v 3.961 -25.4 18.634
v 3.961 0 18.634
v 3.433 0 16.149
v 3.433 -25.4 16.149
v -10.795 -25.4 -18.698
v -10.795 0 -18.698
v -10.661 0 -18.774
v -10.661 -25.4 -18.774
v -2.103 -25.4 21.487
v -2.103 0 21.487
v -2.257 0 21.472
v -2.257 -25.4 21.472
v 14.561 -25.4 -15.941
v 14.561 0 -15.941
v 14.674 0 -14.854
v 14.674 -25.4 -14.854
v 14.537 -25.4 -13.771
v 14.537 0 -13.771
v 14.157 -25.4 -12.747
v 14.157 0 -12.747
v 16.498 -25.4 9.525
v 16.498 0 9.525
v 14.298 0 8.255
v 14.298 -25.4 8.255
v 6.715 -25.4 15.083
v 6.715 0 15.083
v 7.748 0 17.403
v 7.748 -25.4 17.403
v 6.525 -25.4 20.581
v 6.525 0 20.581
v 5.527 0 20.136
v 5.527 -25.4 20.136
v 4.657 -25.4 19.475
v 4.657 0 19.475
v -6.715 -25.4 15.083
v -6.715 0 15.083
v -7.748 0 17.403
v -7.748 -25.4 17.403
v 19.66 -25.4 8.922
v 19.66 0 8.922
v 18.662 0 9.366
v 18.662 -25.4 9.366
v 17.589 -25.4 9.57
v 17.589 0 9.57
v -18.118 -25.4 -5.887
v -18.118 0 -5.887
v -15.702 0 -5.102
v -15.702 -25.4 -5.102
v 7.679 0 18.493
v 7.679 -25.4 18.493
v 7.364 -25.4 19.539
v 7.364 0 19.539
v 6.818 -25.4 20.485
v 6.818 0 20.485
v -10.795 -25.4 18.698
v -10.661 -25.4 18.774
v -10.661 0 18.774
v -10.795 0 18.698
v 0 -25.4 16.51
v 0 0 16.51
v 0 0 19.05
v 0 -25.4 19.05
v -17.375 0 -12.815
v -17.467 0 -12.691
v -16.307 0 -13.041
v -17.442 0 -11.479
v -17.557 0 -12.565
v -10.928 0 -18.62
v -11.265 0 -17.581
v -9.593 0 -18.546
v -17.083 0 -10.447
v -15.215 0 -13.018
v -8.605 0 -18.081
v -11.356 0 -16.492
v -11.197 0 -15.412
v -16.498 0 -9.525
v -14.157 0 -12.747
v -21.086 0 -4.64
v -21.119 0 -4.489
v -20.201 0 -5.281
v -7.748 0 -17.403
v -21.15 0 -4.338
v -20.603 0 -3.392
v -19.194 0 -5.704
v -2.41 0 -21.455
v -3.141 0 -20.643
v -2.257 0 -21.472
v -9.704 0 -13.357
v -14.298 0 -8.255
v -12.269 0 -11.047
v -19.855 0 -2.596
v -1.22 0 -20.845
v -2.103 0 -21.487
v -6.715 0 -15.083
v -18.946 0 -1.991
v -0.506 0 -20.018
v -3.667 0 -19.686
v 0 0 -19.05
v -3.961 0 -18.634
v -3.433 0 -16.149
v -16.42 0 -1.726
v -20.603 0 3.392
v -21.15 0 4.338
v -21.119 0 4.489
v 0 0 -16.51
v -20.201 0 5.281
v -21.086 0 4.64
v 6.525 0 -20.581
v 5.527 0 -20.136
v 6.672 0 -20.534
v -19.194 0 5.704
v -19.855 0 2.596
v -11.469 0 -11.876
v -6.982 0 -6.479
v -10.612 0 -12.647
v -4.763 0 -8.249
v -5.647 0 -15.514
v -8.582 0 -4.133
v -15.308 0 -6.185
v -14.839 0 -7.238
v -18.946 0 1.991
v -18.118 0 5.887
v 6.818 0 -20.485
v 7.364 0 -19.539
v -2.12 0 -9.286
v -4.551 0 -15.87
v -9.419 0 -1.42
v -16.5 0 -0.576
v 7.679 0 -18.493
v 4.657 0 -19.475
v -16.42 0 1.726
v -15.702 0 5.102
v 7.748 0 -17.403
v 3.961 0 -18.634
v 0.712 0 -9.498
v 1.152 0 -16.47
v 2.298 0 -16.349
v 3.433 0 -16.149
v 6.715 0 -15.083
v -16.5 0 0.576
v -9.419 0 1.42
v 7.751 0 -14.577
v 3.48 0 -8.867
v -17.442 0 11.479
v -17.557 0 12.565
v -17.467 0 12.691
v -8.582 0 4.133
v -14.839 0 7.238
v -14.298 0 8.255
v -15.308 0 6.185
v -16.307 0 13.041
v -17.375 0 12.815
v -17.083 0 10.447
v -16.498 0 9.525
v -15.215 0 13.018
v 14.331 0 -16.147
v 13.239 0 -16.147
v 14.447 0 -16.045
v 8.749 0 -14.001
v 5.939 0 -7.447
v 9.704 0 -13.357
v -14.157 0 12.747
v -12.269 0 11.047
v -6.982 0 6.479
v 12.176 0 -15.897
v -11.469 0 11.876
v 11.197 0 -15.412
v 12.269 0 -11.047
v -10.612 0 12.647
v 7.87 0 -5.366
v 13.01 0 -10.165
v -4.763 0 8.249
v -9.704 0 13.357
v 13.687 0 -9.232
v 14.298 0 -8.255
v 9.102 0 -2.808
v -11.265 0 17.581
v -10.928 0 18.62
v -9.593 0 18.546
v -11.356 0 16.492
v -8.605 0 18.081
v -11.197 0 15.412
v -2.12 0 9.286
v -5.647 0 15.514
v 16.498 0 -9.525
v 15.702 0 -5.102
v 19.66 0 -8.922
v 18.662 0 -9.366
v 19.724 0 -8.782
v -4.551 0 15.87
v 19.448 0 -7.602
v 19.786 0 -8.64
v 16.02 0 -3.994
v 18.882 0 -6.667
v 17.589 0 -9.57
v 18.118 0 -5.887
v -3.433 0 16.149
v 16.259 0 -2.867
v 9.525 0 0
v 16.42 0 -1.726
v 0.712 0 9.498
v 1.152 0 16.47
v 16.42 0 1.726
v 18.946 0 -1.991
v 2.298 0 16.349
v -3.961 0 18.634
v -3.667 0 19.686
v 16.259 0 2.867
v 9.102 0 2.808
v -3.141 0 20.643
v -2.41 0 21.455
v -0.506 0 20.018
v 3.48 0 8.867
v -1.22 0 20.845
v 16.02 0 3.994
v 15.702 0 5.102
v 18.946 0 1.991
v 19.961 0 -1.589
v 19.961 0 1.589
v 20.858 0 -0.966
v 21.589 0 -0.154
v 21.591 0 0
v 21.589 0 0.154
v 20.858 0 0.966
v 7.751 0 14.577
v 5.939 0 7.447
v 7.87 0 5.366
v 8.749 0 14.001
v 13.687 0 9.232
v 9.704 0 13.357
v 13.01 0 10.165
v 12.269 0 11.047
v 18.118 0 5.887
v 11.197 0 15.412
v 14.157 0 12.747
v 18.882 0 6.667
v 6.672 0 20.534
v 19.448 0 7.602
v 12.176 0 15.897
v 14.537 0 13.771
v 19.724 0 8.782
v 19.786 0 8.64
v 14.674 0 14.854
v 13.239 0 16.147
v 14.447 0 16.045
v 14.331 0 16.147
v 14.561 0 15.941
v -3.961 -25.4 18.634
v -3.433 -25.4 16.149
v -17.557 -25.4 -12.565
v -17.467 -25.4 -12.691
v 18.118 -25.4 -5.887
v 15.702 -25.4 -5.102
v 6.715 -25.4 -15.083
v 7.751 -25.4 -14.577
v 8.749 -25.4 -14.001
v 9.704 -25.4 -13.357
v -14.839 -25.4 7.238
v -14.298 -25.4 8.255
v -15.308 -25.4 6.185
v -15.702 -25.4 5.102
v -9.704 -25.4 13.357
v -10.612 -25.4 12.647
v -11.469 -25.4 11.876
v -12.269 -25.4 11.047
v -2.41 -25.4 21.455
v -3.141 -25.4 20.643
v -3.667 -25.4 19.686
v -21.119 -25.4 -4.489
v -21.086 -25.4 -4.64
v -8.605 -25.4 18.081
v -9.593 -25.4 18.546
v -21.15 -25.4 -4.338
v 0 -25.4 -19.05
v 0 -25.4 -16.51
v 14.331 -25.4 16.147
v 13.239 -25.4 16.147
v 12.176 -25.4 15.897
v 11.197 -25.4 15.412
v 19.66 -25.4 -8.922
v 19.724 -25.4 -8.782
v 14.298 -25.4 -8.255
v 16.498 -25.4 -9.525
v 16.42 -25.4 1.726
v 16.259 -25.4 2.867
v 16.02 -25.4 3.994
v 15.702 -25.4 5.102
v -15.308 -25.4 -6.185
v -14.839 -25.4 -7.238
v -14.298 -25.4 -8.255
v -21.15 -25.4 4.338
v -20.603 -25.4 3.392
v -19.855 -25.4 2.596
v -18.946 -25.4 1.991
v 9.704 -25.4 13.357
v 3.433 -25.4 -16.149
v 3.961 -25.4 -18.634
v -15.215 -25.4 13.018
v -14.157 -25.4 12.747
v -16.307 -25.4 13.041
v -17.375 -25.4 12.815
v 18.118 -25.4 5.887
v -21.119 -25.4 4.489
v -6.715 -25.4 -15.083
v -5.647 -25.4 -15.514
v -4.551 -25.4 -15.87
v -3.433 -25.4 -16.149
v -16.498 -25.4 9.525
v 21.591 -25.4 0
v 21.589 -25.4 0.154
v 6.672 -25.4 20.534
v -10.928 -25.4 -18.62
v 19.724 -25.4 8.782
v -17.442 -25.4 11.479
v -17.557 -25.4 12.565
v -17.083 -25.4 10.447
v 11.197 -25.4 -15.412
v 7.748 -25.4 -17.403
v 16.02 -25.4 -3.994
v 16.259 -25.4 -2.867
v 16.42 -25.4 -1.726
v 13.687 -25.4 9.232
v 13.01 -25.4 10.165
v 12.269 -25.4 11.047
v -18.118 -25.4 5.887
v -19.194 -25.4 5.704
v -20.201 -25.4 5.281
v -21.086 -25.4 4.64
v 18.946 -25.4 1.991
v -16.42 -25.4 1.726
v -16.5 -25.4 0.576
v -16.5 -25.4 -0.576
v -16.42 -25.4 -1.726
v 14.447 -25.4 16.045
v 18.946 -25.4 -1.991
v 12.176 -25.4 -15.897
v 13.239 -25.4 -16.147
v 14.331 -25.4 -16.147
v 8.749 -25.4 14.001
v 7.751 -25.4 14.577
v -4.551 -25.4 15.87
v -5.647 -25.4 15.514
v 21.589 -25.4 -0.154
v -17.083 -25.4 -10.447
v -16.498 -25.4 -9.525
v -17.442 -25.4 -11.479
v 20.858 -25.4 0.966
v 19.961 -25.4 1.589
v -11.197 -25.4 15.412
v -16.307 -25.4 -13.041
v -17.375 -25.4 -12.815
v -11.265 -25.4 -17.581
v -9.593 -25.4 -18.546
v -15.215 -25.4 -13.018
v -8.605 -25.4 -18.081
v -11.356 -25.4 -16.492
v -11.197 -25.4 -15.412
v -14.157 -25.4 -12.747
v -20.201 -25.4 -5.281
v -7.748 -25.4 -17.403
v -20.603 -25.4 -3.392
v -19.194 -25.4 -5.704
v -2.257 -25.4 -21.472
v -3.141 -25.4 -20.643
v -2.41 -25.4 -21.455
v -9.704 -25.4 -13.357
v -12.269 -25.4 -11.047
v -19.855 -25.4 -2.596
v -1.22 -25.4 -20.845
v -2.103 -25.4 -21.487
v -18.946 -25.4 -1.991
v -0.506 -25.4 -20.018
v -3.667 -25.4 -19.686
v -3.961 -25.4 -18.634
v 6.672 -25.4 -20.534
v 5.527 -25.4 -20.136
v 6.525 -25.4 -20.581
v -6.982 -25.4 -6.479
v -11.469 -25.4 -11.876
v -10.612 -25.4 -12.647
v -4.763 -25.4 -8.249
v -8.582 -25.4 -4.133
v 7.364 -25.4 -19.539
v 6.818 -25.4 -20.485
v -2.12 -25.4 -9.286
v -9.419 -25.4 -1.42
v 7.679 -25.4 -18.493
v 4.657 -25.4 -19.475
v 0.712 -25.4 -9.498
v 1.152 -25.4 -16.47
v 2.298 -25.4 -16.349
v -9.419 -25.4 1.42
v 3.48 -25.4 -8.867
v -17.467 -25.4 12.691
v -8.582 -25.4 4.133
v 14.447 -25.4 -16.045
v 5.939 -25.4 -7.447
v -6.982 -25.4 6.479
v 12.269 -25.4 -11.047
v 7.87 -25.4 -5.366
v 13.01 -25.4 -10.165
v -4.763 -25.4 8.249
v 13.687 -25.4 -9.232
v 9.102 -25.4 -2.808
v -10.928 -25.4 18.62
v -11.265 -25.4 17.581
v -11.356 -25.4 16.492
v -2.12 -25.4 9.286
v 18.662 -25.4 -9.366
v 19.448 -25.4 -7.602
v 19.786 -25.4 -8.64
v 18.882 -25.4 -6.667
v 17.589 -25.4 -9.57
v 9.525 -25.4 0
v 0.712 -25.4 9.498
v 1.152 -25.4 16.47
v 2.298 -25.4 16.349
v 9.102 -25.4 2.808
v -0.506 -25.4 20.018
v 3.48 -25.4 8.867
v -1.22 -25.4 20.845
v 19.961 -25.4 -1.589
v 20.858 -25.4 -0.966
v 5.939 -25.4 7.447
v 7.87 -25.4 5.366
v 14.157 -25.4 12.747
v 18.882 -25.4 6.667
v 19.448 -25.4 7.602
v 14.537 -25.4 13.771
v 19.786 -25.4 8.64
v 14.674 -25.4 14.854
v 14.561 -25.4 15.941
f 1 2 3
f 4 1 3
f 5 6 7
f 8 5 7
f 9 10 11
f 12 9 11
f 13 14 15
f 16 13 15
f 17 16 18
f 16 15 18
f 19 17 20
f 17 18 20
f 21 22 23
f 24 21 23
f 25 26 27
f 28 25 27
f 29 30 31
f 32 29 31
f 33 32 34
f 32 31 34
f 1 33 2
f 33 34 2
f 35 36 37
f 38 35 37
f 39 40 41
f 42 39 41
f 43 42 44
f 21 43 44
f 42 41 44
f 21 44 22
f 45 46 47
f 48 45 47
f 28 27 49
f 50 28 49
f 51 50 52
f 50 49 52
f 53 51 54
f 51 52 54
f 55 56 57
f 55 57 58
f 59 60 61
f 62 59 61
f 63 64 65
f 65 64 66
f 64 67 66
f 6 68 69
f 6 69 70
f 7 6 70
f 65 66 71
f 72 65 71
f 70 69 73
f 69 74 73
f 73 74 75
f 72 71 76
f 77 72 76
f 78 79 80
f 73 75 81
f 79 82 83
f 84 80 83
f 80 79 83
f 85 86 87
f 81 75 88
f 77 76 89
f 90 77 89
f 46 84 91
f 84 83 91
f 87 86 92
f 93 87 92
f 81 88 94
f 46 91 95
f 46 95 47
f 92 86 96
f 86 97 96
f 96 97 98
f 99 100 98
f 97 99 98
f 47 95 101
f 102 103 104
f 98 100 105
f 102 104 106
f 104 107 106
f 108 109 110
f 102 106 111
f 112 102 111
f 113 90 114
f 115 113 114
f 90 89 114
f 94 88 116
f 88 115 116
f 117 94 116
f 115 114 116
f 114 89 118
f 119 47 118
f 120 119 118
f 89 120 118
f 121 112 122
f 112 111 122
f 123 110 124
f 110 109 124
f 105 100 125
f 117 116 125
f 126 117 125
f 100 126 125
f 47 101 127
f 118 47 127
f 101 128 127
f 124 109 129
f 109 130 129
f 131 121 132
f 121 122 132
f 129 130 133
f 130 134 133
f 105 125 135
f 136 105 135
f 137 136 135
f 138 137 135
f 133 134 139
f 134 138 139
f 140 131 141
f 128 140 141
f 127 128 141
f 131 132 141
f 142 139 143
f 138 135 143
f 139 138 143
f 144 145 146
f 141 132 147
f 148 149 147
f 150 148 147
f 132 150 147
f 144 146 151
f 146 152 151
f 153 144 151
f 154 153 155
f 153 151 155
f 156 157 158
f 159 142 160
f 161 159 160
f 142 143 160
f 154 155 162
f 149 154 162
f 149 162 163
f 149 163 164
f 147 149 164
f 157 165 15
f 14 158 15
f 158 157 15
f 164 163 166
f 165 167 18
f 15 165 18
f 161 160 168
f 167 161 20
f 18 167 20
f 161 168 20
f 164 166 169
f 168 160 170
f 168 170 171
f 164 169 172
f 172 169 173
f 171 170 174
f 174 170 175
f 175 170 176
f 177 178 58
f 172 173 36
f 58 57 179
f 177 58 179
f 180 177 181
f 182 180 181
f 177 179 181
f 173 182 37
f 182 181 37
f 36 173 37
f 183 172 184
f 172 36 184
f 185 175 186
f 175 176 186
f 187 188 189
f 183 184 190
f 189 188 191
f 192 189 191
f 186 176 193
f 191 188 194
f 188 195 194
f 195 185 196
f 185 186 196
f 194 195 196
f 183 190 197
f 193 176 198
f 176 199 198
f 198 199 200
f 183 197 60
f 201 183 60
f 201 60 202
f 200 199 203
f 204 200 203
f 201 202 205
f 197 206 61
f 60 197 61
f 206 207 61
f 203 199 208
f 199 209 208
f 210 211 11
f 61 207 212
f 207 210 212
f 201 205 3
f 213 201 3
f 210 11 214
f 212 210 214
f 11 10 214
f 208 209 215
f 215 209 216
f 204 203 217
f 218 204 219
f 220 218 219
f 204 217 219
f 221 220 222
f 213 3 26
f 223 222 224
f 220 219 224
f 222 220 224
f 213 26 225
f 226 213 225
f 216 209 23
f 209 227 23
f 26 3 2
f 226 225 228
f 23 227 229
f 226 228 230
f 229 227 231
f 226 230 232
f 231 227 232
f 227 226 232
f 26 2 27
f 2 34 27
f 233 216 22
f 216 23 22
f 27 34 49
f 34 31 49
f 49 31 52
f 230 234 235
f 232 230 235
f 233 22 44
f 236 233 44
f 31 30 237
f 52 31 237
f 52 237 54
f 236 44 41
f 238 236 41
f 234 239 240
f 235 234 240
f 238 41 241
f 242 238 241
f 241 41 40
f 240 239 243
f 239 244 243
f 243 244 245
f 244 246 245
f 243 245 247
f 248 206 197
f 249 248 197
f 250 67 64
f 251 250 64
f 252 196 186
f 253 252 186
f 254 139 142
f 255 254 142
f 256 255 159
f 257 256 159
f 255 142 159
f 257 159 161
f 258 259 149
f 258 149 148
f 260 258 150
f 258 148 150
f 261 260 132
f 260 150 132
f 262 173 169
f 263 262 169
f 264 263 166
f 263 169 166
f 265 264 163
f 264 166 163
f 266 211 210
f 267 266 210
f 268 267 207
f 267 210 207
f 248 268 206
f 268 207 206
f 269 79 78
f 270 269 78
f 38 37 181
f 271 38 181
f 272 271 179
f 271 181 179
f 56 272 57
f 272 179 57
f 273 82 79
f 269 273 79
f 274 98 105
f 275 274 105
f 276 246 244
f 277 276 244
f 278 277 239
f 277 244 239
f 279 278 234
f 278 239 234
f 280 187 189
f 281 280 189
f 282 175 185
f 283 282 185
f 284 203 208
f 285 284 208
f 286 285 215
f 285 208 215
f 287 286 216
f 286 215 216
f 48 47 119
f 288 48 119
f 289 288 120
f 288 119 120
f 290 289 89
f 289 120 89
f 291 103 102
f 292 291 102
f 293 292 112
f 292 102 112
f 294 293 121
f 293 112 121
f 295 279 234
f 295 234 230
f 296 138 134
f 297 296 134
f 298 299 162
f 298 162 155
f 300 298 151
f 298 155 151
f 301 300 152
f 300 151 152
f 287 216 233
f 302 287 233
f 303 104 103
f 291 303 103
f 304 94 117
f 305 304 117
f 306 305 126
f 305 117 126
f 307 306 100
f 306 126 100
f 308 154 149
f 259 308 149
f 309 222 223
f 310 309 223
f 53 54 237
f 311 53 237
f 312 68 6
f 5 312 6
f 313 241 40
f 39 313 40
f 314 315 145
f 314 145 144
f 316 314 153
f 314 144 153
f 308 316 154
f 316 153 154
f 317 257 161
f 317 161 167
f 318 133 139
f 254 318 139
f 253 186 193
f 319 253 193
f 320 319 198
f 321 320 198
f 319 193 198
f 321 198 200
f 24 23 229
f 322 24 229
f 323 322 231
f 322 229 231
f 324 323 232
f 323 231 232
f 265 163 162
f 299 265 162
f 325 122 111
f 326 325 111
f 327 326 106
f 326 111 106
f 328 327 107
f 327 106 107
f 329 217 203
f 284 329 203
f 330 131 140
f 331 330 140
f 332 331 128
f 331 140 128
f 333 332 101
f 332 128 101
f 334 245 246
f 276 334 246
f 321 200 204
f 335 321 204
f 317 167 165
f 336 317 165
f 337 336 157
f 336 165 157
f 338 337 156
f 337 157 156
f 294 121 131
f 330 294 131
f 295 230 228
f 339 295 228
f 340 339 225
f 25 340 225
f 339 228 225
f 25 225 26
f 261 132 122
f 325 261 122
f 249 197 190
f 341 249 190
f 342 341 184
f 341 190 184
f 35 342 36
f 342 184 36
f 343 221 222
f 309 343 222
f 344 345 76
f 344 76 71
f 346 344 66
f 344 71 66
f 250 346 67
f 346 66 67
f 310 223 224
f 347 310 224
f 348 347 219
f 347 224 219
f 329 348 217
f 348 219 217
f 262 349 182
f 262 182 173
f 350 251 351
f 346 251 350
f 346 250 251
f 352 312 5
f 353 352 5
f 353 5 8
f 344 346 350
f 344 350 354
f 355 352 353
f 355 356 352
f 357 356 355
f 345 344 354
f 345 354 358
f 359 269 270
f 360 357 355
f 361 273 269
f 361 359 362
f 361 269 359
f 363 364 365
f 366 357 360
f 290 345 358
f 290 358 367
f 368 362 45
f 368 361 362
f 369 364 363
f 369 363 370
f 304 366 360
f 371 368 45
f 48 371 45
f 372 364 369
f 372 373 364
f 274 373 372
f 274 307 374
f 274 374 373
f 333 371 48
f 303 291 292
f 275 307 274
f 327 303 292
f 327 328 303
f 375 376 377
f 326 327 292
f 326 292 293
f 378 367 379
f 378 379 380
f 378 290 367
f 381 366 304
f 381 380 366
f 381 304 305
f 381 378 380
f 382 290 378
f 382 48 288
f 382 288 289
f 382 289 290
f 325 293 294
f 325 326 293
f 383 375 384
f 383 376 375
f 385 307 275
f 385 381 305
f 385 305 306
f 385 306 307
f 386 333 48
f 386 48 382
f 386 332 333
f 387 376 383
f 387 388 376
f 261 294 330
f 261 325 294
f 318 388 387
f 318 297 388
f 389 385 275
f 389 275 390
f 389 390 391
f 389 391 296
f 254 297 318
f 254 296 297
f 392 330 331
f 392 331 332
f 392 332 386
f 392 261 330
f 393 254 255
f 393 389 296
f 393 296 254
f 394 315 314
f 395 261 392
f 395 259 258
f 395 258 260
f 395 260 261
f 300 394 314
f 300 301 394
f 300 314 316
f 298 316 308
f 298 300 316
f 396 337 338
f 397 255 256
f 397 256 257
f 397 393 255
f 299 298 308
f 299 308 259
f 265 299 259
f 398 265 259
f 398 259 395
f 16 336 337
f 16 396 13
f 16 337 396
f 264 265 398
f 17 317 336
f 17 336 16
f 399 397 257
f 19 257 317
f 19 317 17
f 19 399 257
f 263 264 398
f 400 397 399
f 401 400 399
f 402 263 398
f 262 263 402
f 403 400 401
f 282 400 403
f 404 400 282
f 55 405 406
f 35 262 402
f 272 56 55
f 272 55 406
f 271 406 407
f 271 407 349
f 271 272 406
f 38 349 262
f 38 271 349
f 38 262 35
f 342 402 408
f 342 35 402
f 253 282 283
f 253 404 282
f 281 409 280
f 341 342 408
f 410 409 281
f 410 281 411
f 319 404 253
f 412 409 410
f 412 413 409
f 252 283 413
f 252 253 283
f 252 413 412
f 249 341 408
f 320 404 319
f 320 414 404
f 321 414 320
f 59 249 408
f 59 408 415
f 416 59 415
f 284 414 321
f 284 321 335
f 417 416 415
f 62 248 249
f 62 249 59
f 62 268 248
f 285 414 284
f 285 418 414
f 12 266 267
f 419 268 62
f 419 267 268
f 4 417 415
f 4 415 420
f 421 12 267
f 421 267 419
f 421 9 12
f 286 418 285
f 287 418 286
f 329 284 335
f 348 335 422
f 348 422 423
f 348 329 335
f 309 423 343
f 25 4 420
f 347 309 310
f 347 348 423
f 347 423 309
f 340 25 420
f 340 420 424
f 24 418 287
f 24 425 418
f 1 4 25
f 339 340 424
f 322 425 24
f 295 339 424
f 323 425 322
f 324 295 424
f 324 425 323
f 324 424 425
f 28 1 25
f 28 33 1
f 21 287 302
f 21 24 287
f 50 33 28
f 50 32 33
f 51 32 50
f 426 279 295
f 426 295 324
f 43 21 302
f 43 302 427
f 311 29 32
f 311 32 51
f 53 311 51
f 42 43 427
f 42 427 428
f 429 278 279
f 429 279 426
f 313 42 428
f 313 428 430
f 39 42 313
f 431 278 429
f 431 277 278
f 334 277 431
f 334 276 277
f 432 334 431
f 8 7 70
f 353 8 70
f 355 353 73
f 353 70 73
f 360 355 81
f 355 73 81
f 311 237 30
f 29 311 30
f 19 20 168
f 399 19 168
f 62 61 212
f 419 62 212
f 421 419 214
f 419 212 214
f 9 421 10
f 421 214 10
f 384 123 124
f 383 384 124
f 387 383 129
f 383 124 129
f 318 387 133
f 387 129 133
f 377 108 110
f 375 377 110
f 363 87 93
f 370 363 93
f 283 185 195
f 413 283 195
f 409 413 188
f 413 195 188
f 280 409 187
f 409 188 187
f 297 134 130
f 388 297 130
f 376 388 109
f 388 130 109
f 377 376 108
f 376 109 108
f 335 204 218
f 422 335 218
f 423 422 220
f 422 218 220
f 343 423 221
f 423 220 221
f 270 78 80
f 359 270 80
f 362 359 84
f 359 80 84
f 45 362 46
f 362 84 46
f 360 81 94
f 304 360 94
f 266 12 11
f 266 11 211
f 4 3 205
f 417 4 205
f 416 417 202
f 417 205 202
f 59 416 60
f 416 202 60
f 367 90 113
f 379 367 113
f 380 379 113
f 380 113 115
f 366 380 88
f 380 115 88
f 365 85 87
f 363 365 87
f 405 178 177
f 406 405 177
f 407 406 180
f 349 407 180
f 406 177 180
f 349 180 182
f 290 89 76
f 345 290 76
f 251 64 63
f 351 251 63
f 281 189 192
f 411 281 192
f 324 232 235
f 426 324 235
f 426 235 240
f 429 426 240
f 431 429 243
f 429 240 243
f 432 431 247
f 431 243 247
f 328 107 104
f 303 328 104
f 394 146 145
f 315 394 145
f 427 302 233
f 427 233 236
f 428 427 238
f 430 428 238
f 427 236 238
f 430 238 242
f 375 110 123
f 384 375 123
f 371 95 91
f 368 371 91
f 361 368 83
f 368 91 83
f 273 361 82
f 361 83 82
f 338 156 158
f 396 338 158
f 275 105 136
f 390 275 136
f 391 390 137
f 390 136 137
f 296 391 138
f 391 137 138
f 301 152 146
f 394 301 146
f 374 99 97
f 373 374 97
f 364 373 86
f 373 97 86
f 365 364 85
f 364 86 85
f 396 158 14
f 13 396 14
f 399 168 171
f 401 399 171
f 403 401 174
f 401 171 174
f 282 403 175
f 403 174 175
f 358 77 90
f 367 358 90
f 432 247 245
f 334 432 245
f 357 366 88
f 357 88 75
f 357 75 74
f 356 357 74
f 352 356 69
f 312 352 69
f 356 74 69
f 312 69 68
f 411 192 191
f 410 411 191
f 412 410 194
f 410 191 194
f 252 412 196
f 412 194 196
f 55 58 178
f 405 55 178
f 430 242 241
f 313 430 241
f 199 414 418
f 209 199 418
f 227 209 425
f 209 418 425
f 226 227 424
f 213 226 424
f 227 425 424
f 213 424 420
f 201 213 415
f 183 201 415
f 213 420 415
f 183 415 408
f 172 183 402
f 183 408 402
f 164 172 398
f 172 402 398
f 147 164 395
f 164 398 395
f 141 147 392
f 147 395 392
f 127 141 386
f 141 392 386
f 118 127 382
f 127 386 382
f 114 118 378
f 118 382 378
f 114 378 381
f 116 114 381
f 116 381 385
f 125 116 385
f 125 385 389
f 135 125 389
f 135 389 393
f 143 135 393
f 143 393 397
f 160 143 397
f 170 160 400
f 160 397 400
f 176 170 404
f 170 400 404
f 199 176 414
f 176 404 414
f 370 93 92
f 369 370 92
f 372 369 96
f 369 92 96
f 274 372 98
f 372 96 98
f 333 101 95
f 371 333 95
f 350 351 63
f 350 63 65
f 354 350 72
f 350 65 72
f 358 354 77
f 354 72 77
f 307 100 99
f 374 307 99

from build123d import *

# Parameters (mm, degrees)
F1_DEPTH = 25.4
F2_R     = 9.525
F3_DEPTH = 25.4


with BuildPart() as f1:
    # F0 (on Front) → F1 (new body)
    with BuildSketch(Plane.XZ):
        with BuildLine():
            Line((-3.960718, 18.633712), (-3.432622, 16.149217))
            ThreePointArc((-3.432622, 16.149217), (-5.101871, 15.701943), (-6.715222, 15.082636))
            Line((-6.715222, 15.082636), (-7.748333, 17.403041))
            ThreePointArc((-7.748333, 17.403041), (-9.085269, 18.342204), (-10.660947, 18.774246))
            Line((-10.660947, 18.774246), (-10.795276, 18.697967))
            Line((-10.795276, 18.697967), (-10.9285, 18.619774))
            ThreePointArc((-10.9285, 18.619774), (-11.34218, 17.039175), (-11.197309, 15.411774))
            Line((-11.197309, 15.411774), (-9.704335, 13.356871))
            ThreePointArc((-9.704335, 13.356871), (-11.047346, 12.269321), (-12.269321, 11.047346))
            Line((-12.269321, 11.047346), (-14.156909, 12.746938))
            ThreePointArc((-14.156909, 12.746938), (-15.760252, 13.061125), (-17.375434, 12.814929))
            Line((-17.375434, 12.814929), (-17.467124, 12.690608))
            Line((-17.467124, 12.690608), (-17.557026, 12.564989))
            ThreePointArc((-17.557026, 12.564989), (-17.292054, 10.952781), (-16.497784, 9.525))
            Line((-16.497784, 9.525), (-14.298079, 8.255))
            ThreePointArc((-14.298079, 8.255), (-15.082636, 6.715222), (-15.701943, 5.101871))
            Line((-15.701943, 5.101871), (-18.117627, 5.886774))
            ThreePointArc((-18.117627, 5.886774), (-19.710145, 5.52166), (-21.08555, 4.639795))
            Line((-21.08555, 4.639795), (-21.118747, 4.488928))
            Line((-21.118747, 4.488928), (-21.149783, 4.337602))
            ThreePointArc((-21.149783, 4.337602), (-20.251975, 2.972551), (-18.945642, 1.991267))
            Line((-18.945642, 1.991267), (-16.419556, 1.725765))
            ThreePointArc((-16.419556, 1.725765), (-16.51, 0), (-16.419556, -1.725765))
            Line((-16.419556, -1.725765), (-18.945642, -1.991267))
            ThreePointArc((-18.945642, -1.991267), (-20.251975, -2.972551), (-21.149783, -4.337602))
            Line((-21.149783, -4.337602), (-21.118747, -4.488928))
            Line((-21.118747, -4.488928), (-21.08555, -4.639795))
            ThreePointArc((-21.08555, -4.639795), (-19.710145, -5.52166), (-18.117627, -5.886774))
            Line((-18.117627, -5.886774), (-15.701943, -5.101871))
            ThreePointArc((-15.701943, -5.101871), (-15.082636, -6.715222), (-14.298079, -8.255))
            Line((-14.298079, -8.255), (-16.497784, -9.525))
            ThreePointArc((-16.497784, -9.525), (-17.292054, -10.952781), (-17.557026, -12.564989))
            Line((-17.557026, -12.564989), (-17.467124, -12.690608))
            Line((-17.467124, -12.690608), (-17.375434, -12.814929))
            ThreePointArc((-17.375434, -12.814929), (-15.760252, -13.061125), (-14.156909, -12.746938))
            Line((-14.156909, -12.746938), (-12.269321, -11.047346))
            ThreePointArc((-12.269321, -11.047346), (-11.047346, -12.269321), (-9.704335, -13.356871))
            Line((-9.704335, -13.356871), (-11.197309, -15.411774))
            ThreePointArc((-11.197309, -15.411774), (-11.34218, -17.039175), (-10.9285, -18.619774))
            Line((-10.9285, -18.619774), (-10.795276, -18.697967))
            Line((-10.795276, -18.697967), (-10.660947, -18.774246))
            ThreePointArc((-10.660947, -18.774246), (-9.085269, -18.342204), (-7.748333, -17.403041))
            Line((-7.748333, -17.403041), (-6.715222, -15.082636))
            ThreePointArc((-6.715222, -15.082636), (-5.101871, -15.701943), (-3.432622, -16.149217))
            Line((-3.432622, -16.149217), (-3.960718, -18.633712))
            ThreePointArc((-3.960718, -18.633712), (-3.43114, -20.179342), (-2.410337, -21.455031))
            Line((-2.410337, -21.455031), (-2.256827, -21.472277))
            Line((-2.256827, -21.472277), (-2.103086, -21.487325))
            ThreePointArc((-2.103086, -21.487325), (-0.839359, -20.451749), (0, -19.05))
            Line((0, -19.05), (0, -16.51))
            ThreePointArc((0, -16.51), (1.725765, -16.419556), (3.432622, -16.149217))
            Line((3.432622, -16.149217), (3.960718, -18.633712))
            ThreePointArc((3.960718, -18.633712), (5.073175, -19.830316), (6.524595, -20.580519))
            Line((6.524595, -20.580519), (6.671848, -20.533836))
            Line((6.671848, -20.533836), (6.818418, -20.48505))
            ThreePointArc((6.818418, -20.48505), (7.551683, -19.025), (7.748333, -17.403041))
            Line((7.748333, -17.403041), (6.715222, -15.082636))
            ThreePointArc((6.715222, -15.082636), (8.255, -14.298079), (9.704335, -13.356871))
            Line((9.704335, -13.356871), (11.197309, -15.411774))
            ThreePointArc((11.197309, -15.411774), (12.700292, -16.052449), (14.331365, -16.147448))
            Line((14.331365, -16.147448), (14.4469, -16.044907))
            Line((14.4469, -16.044907), (14.560955, -15.940724))
            ThreePointArc((14.560955, -15.940724), (14.63697, -14.308657), (14.156909, -12.746938))
            Line((14.156909, -12.746938), (12.269321, -11.047346))
            ThreePointArc((12.269321, -11.047346), (13.356871, -9.704335), (14.298079, -8.255))
            Line((14.298079, -8.255), (16.497784, -9.525))
            ThreePointArc((16.497784, -9.525), (18.131414, -9.498968), (19.660112, -8.922336))
            Line((19.660112, -8.922336), (19.723951, -8.781669))
            Line((19.723951, -8.781669), (19.785771, -8.640102))
            ThreePointArc((19.785771, -8.640102), (19.191393, -7.118216), (18.117627, -5.886774))
            Line((18.117627, -5.886774), (15.701943, -5.101871))
            ThreePointArc((15.701943, -5.101871), (16.149217, -3.432622), (16.419556, -1.725765))
            Line((16.419556, -1.725765), (18.945642, -1.991267))
            ThreePointArc((18.945642, -1.991267), (20.427449, -1.303029), (21.589447, -0.154472))
            Line((21.589447, -0.154472), (21.590553, 0))
            Line((21.590553, 0), (21.589447, 0.154472))
            ThreePointArc((21.589447, 0.154472), (20.427449, 1.303029), (18.945642, 1.991267))
            Line((18.945642, 1.991267), (16.419556, 1.725765))
            ThreePointArc((16.419556, 1.725765), (16.149217, 3.432622), (15.701943, 5.101871))
            Line((15.701943, 5.101871), (18.117627, 5.886774))
            ThreePointArc((18.117627, 5.886774), (19.191393, 7.118216), (19.785771, 8.640102))
            Line((19.785771, 8.640102), (19.723951, 8.781669))
            Line((19.723951, 8.781669), (19.660112, 8.922336))
            ThreePointArc((19.660112, 8.922336), (18.131414, 9.498968), (16.497784, 9.525))
            Line((16.497784, 9.525), (14.298079, 8.255))
            ThreePointArc((14.298079, 8.255), (13.356871, 9.704335), (12.269321, 11.047346))
            Line((12.269321, 11.047346), (14.156909, 12.746938))
            ThreePointArc((14.156909, 12.746938), (14.63697, 14.308657), (14.560955, 15.940724))
            Line((14.560955, 15.940724), (14.4469, 16.044907))
            Line((14.4469, 16.044907), (14.331365, 16.147448))
            ThreePointArc((14.331365, 16.147448), (12.700292, 16.052449), (11.197309, 15.411774))
            Line((11.197309, 15.411774), (9.704335, 13.356871))
            ThreePointArc((9.704335, 13.356871), (8.255, 14.298079), (6.715222, 15.082636))
            Line((6.715222, 15.082636), (7.748333, 17.403041))
            ThreePointArc((7.748333, 17.403041), (7.551683, 19.025), (6.818418, 20.48505))
            Line((6.818418, 20.48505), (6.671848, 20.533836))
            Line((6.671848, 20.533836), (6.524595, 20.580519))
            ThreePointArc((6.524595, 20.580519), (5.073175, 19.830316), (3.960718, 18.633712))
            Line((3.960718, 18.633712), (3.432622, 16.149217))
            ThreePointArc((3.432622, 16.149217), (1.725765, 16.419556), (0, 16.51))
            Line((0, 16.51), (0, 19.05))
            ThreePointArc((0, 19.05), (-0.839359, 20.451749), (-2.103086, 21.487325))
            Line((-2.103086, 21.487325), (-2.256827, 21.472277))
            Line((-2.256827, 21.472277), (-2.410337, 21.455031))
            ThreePointArc((-2.410337, 21.455031), (-3.43114, 20.179342), (-3.960718, 18.633712))
        make_face()
    extrude(amount=F1_DEPTH)

    # F2 (on face) → F3 (cut)
    with BuildSketch(Plane.XZ.offset(25.4)):
        Circle(F2_R)
    extrude(amount=-F3_DEPTH, mode=Mode.SUBTRACT)


solid = f1.part
